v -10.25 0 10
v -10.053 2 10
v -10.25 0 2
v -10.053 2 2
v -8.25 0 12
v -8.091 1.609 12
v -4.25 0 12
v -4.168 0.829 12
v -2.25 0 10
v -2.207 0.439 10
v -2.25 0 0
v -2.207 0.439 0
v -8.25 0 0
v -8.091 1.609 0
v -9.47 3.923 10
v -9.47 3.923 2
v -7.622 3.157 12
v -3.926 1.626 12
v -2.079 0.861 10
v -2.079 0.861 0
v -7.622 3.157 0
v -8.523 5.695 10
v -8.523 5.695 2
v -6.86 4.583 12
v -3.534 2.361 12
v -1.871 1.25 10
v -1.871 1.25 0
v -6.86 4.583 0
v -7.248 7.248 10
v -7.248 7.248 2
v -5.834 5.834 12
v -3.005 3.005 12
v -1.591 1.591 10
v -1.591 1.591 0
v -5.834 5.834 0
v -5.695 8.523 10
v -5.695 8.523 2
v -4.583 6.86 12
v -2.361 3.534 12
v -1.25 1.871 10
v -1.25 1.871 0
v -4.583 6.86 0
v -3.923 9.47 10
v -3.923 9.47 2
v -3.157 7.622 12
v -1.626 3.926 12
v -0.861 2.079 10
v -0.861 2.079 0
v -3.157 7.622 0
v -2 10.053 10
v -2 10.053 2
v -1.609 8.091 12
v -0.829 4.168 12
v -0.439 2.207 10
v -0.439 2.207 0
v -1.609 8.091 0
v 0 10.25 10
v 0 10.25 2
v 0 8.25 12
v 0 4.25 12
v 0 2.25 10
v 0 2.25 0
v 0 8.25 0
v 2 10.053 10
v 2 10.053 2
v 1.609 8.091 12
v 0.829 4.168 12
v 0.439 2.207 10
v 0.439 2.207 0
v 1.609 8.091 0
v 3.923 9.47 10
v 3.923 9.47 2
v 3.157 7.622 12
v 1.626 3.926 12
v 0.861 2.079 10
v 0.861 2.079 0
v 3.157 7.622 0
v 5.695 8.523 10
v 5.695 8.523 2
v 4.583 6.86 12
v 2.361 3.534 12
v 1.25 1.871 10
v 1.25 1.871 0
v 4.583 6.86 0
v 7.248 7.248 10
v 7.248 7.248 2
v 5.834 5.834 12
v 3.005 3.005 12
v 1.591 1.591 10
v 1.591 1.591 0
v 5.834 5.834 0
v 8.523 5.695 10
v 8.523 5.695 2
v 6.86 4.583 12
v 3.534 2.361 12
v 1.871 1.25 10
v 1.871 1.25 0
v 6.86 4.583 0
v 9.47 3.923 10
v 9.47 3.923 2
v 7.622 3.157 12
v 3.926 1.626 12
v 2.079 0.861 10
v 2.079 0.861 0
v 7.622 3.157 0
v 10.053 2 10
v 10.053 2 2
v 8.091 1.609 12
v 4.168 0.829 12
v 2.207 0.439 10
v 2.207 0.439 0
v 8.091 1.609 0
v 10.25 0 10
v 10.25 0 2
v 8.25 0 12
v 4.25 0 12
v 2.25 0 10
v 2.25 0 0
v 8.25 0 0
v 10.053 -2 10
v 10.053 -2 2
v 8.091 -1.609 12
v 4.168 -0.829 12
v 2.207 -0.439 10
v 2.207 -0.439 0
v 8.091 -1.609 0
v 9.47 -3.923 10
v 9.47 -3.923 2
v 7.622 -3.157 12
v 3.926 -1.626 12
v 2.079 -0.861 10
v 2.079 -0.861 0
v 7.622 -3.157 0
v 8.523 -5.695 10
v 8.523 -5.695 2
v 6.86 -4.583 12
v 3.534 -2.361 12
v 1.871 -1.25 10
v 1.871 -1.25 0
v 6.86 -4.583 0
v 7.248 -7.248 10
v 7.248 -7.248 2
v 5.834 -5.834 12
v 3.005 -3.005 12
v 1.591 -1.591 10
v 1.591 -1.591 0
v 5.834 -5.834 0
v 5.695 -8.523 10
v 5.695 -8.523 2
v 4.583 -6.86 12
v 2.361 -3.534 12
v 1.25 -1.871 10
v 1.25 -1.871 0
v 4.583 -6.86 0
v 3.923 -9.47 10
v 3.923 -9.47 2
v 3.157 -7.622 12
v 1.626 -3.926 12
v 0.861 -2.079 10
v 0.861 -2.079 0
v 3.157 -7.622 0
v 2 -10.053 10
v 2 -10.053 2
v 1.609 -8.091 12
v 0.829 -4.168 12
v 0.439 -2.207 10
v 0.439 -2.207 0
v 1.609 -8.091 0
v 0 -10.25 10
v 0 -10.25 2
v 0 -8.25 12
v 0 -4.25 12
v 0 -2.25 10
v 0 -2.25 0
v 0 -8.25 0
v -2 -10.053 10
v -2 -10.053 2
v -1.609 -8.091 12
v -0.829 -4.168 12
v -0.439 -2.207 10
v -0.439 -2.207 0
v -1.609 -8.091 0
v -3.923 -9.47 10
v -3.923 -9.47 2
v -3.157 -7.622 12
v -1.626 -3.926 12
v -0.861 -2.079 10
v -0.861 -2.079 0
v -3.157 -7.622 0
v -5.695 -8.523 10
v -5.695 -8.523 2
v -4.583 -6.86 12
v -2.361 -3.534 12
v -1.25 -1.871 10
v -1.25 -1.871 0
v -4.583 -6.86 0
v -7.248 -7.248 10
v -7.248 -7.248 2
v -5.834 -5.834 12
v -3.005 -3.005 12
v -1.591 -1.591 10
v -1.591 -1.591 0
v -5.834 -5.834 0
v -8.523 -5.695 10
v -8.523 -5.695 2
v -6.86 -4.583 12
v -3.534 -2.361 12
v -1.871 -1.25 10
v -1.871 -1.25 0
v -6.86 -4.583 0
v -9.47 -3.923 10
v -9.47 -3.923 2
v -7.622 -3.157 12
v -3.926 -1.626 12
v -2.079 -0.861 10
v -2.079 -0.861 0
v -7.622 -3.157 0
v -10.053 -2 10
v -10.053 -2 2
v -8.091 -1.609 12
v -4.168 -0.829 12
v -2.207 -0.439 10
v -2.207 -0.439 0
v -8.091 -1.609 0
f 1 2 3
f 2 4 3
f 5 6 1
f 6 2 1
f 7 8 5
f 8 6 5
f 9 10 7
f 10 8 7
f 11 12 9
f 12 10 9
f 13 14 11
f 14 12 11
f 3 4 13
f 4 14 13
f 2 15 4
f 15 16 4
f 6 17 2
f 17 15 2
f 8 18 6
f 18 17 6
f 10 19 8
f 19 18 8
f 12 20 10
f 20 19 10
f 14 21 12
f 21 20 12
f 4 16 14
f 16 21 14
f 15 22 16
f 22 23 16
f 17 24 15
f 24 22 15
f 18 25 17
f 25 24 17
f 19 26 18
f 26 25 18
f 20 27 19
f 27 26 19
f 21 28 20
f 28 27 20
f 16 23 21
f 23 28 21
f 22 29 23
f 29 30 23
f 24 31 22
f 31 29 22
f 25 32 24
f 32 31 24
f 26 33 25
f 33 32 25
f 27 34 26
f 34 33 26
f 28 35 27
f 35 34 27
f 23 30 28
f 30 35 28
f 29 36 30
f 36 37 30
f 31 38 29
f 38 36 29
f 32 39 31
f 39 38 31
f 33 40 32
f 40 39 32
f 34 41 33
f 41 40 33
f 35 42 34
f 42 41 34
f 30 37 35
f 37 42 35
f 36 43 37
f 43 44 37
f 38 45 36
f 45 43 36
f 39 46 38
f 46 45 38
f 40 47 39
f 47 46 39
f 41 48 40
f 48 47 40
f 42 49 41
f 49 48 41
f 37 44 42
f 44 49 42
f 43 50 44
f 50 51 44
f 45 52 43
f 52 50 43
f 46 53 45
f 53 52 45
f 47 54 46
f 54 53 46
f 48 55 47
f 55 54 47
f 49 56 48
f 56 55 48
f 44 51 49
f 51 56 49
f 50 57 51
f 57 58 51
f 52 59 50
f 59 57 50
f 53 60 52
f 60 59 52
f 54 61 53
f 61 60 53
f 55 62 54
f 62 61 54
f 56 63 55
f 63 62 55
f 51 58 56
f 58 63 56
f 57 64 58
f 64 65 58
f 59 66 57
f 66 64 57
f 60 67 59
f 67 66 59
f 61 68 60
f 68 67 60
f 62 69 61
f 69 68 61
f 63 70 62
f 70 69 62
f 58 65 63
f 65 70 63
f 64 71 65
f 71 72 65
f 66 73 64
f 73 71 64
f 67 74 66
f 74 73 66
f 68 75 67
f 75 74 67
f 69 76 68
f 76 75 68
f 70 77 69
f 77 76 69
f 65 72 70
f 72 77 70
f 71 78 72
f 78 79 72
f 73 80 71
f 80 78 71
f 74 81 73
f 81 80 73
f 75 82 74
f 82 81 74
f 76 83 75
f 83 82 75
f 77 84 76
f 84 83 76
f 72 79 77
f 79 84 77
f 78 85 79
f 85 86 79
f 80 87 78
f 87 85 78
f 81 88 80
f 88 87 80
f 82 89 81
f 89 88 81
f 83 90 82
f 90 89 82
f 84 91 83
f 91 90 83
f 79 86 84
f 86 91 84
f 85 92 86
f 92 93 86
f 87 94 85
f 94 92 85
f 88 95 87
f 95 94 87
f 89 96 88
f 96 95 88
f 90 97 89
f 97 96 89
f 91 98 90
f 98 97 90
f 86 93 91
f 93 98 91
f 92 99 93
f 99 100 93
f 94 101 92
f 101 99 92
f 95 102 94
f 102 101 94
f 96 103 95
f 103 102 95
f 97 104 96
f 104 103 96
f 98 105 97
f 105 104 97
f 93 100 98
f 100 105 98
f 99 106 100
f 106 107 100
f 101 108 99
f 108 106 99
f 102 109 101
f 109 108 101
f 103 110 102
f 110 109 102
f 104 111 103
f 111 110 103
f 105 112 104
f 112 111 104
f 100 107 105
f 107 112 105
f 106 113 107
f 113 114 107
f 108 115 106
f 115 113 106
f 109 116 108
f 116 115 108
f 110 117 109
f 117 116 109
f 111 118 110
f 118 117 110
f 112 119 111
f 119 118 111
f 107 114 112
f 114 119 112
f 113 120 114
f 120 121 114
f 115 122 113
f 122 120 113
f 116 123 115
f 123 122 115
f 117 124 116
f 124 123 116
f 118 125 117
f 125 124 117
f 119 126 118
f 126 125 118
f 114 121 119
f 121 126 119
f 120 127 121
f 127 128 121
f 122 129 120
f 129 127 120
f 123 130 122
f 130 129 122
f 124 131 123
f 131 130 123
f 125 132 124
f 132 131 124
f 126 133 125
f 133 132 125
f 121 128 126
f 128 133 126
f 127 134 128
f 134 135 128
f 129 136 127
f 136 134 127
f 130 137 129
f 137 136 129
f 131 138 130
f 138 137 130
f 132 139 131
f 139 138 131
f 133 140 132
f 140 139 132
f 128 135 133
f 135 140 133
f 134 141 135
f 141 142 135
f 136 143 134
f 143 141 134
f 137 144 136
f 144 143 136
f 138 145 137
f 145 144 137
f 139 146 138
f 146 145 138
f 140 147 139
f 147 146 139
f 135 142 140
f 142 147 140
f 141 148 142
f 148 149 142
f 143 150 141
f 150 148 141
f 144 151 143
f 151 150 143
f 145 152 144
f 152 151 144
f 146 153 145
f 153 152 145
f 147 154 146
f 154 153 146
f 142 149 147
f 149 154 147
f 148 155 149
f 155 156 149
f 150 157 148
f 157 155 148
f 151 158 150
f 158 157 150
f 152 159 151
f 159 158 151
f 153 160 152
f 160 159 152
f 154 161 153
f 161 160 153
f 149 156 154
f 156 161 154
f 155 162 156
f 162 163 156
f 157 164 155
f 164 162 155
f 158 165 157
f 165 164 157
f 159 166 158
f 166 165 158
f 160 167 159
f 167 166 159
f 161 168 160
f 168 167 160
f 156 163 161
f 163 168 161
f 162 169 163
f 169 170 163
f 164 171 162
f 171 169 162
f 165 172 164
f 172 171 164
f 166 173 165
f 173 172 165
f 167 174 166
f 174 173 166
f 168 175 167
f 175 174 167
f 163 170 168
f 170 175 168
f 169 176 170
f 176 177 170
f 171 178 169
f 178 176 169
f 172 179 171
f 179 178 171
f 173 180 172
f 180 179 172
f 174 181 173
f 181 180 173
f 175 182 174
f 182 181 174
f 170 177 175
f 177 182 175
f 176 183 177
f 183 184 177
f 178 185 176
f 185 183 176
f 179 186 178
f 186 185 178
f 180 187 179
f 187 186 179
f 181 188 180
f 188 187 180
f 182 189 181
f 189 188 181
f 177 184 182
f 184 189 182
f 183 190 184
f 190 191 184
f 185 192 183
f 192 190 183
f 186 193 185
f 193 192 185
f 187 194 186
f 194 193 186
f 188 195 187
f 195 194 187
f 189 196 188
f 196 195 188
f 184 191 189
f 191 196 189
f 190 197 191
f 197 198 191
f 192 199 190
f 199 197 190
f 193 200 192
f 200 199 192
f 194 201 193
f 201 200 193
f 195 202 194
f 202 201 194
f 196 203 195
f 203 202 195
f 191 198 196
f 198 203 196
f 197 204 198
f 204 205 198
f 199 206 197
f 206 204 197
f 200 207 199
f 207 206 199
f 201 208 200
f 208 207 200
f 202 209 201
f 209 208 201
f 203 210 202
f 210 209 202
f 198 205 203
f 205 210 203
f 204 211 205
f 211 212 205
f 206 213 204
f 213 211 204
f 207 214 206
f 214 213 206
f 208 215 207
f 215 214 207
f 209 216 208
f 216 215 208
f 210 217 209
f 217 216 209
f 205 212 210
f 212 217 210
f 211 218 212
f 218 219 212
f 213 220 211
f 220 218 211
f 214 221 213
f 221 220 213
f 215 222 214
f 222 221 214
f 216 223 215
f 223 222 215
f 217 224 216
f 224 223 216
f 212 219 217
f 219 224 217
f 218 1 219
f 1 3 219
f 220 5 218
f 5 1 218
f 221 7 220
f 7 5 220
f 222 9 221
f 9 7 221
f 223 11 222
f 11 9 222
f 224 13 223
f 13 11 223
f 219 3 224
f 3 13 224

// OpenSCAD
$fn = 32;

// ----------------------------------------------------------------------
// Form washer: chamfered washer, 20.5 mm outside, 4.5 mm bore
// ----------------------------------------------------------------------

// --- parameters (mm) ---
revolve_angle = 360;      // full turn around the Z axis
profile_points = 7;       // points of the closed outline

profile = [[2.25, 0], [8.25, 0], [10.25, 2], [10.25, 10], [8.25, 12], [4.25, 12], [2.25, 10]];  // single closed polygon, 7 points, counter clockwise

// --- the one profile operation ---
rotate_extrude(angle = revolve_angle) polygon(points = profile);
